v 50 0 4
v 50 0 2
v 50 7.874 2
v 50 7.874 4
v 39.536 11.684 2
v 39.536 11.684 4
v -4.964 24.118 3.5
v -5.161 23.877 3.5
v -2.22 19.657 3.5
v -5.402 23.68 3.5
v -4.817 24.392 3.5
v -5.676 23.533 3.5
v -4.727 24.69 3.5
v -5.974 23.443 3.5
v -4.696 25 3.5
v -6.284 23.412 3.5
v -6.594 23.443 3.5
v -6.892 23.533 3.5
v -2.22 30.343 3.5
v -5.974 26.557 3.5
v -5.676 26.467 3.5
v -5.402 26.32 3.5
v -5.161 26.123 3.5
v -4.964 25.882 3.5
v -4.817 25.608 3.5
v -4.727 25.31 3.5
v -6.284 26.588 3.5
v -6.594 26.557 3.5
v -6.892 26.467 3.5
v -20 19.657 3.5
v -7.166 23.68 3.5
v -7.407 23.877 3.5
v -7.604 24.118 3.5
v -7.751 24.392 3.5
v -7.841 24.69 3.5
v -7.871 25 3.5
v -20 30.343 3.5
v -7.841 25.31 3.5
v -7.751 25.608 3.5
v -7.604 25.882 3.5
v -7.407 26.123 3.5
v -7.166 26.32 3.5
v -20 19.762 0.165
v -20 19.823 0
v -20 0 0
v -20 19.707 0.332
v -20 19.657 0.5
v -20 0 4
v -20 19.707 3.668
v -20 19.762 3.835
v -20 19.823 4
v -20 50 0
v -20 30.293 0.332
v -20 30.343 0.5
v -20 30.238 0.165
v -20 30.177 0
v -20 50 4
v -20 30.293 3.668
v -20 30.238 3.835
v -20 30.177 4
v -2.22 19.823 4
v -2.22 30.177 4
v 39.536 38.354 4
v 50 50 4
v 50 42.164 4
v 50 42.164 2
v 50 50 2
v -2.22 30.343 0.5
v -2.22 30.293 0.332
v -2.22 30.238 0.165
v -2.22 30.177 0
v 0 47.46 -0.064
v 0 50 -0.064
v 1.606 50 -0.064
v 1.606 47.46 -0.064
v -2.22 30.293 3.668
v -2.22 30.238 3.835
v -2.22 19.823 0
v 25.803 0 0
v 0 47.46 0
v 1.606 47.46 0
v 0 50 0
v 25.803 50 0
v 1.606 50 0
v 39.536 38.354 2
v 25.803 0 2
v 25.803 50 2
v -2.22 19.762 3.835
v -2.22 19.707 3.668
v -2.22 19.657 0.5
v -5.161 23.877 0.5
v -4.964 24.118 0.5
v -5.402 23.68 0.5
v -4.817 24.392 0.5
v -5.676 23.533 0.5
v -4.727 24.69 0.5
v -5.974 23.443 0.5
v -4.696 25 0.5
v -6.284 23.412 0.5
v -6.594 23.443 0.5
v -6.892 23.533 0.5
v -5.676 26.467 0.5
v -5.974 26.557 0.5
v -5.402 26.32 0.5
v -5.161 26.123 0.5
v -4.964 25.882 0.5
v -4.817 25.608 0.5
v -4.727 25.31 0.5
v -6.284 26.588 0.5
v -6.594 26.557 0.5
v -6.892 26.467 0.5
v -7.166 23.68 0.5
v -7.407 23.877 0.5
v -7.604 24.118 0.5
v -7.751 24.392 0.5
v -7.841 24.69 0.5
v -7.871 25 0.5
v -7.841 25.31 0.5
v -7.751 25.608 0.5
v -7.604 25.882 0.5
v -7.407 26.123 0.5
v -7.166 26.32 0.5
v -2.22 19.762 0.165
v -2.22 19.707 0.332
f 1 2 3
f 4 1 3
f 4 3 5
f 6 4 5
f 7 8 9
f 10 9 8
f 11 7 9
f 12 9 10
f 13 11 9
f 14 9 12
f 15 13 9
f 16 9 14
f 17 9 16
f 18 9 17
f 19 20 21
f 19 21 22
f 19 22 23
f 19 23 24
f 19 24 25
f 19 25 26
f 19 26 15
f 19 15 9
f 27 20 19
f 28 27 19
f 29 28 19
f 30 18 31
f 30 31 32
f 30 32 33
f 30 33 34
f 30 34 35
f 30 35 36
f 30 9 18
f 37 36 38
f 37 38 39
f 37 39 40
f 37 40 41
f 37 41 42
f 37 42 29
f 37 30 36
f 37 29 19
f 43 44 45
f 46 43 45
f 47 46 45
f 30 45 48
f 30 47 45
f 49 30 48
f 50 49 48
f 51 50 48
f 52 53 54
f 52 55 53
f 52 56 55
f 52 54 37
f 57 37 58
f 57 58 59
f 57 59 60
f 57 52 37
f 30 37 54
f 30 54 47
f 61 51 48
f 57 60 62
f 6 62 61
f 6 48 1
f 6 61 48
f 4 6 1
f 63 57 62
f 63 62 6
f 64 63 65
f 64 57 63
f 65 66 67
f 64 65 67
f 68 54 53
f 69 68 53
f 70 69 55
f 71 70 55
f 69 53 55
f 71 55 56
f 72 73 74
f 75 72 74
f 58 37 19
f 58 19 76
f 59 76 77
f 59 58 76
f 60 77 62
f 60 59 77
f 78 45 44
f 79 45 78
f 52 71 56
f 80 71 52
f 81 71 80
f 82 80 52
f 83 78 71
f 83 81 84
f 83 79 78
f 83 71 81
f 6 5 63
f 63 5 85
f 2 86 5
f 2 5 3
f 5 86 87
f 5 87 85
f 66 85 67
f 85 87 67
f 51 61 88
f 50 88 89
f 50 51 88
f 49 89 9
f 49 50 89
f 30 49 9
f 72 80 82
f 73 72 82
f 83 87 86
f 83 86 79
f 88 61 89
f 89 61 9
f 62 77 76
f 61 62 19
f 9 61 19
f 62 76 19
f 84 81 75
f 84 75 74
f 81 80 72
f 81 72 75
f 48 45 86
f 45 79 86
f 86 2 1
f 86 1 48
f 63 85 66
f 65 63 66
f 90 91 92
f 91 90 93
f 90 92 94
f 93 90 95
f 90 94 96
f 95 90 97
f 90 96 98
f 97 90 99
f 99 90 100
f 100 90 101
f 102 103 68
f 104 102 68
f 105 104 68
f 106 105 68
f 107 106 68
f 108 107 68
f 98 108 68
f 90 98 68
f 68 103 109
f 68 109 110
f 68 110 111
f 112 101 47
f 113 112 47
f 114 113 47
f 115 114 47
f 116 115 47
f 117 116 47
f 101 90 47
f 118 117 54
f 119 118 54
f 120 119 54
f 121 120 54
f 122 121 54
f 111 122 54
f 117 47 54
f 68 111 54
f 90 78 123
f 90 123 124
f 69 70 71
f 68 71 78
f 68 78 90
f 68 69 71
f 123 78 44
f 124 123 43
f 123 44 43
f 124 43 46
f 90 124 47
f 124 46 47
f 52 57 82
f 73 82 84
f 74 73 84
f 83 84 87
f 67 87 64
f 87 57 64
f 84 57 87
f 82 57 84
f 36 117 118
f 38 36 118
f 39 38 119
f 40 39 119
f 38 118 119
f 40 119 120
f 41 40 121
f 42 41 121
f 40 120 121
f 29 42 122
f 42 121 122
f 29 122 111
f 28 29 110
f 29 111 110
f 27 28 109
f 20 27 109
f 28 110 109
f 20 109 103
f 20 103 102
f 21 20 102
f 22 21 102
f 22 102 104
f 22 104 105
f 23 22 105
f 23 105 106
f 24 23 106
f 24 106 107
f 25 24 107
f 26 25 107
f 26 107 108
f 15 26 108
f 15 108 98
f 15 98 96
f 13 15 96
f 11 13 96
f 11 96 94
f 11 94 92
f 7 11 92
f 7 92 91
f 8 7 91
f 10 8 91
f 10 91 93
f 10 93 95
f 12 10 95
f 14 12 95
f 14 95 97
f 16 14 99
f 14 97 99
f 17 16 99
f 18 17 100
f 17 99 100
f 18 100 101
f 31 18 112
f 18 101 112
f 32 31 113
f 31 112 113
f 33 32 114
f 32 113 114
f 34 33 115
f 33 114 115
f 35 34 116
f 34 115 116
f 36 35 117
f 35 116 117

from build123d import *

# Parameters (mm, degrees)
BOSS_EXTRUDE1_DEPTH = 4
SKETCH3_W           = 24.197009966
SKETCH3_H           = 2
CUT_EXTRUDE1_DEPTH  = 51
SKETCH5_W           = 4
SKETCH5_H           = 50
BOSS_EXTRUDE2_DEPTH = 20
CUT_EXTRUDE2_DEPTH  = 17.78
SKETCH7_R           = 1.5875
CUT_EXTRUDE3_DEPTH  = 5
SKETCH8_W           = 1.605980069
SKETCH8_H           = 2.54
BOSS_EXTRUDE3_DEPTH = 4.064


with BuildPart() as part:
    # Sketch2 → Boss-Extrude1 (new body)
    with BuildSketch(Plane.XY):
        Polygon((50, 42.164), (50, 50), (1.605980069, 50), (1.605980069, 47.46), (0, 47.46), (0, 0), (50, 0), (50, 7.874), (39.535978332, 11.684), (39.535978332, 38.354), align=None)
    extrude(amount=BOSS_EXTRUDE1_DEPTH)

    # Sketch3 → Cut-Extrude1 (cut, through all)
    with BuildSketch(Plane(origin=(0, 50, 0), x_dir=(1, 0, 0), z_dir=(0, 1, 0))):
        with Locations((37.901495017, -1)):
            Rectangle(SKETCH3_W, SKETCH3_H)
    extrude(amount=-CUT_EXTRUDE1_DEPTH, mode=Mode.SUBTRACT)

    # Sketch5 → Boss-Extrude2 (add)
    with BuildSketch(Plane.ZY):
        with Locations((2, 25)):
            Rectangle(SKETCH5_W, SKETCH5_H)
    extrude(amount=BOSS_EXTRUDE2_DEPTH)

    # Sketch6 → Cut-Extrude2 (cut)
    with BuildSketch(Plane.ZY.offset(20)):
        with BuildLine():
            Line((3.5, 19.656649926), (3.5, 30.343350074))
            ThreePointArc((3.5, 30.343350074), (3.751975341, 30.266115496), (4, 30.177005892))
            Line((4, 30.177005892), (4, 19.822994108))
            ThreePointArc((4, 19.822994108), (3.751975341, 19.733884504), (3.5, 19.656649926))
        make_face()
        with BuildLine():
            Line((0.5, 19.656649926), (0.5, 30.343350074))
            ThreePointArc((0.5, 30.343350074), (0.248024659, 30.266115496), (0, 30.177005892))
            Line((0, 30.177005892), (0, 19.822994108))
            ThreePointArc((0, 19.822994108), (0.248024659, 19.733884504), (0.5, 19.656649926))
        make_face()
    extrude(amount=-CUT_EXTRUDE2_DEPTH, mode=Mode.SUBTRACT)

    # Sketch7 → Cut-Extrude3 (cut, through all)
    with BuildSketch(Plane(origin=(0, 0, 0), x_dir=(-1, 0, 0), z_dir=(0, 0, -1))):
        with Locations((6.284, 25)):
            Circle(SKETCH7_R)
    extrude(amount=-CUT_EXTRUDE3_DEPTH, mode=Mode.SUBTRACT)

    # Sketch8 → Boss-Extrude3 (add)
    with BuildSketch(Plane.XY.offset(4)):
        with Locations((0.802990035, 48.73)):
            Rectangle(SKETCH8_W, SKETCH8_H)
    extrude(amount=-BOSS_EXTRUDE3_DEPTH)


solid = part.part
